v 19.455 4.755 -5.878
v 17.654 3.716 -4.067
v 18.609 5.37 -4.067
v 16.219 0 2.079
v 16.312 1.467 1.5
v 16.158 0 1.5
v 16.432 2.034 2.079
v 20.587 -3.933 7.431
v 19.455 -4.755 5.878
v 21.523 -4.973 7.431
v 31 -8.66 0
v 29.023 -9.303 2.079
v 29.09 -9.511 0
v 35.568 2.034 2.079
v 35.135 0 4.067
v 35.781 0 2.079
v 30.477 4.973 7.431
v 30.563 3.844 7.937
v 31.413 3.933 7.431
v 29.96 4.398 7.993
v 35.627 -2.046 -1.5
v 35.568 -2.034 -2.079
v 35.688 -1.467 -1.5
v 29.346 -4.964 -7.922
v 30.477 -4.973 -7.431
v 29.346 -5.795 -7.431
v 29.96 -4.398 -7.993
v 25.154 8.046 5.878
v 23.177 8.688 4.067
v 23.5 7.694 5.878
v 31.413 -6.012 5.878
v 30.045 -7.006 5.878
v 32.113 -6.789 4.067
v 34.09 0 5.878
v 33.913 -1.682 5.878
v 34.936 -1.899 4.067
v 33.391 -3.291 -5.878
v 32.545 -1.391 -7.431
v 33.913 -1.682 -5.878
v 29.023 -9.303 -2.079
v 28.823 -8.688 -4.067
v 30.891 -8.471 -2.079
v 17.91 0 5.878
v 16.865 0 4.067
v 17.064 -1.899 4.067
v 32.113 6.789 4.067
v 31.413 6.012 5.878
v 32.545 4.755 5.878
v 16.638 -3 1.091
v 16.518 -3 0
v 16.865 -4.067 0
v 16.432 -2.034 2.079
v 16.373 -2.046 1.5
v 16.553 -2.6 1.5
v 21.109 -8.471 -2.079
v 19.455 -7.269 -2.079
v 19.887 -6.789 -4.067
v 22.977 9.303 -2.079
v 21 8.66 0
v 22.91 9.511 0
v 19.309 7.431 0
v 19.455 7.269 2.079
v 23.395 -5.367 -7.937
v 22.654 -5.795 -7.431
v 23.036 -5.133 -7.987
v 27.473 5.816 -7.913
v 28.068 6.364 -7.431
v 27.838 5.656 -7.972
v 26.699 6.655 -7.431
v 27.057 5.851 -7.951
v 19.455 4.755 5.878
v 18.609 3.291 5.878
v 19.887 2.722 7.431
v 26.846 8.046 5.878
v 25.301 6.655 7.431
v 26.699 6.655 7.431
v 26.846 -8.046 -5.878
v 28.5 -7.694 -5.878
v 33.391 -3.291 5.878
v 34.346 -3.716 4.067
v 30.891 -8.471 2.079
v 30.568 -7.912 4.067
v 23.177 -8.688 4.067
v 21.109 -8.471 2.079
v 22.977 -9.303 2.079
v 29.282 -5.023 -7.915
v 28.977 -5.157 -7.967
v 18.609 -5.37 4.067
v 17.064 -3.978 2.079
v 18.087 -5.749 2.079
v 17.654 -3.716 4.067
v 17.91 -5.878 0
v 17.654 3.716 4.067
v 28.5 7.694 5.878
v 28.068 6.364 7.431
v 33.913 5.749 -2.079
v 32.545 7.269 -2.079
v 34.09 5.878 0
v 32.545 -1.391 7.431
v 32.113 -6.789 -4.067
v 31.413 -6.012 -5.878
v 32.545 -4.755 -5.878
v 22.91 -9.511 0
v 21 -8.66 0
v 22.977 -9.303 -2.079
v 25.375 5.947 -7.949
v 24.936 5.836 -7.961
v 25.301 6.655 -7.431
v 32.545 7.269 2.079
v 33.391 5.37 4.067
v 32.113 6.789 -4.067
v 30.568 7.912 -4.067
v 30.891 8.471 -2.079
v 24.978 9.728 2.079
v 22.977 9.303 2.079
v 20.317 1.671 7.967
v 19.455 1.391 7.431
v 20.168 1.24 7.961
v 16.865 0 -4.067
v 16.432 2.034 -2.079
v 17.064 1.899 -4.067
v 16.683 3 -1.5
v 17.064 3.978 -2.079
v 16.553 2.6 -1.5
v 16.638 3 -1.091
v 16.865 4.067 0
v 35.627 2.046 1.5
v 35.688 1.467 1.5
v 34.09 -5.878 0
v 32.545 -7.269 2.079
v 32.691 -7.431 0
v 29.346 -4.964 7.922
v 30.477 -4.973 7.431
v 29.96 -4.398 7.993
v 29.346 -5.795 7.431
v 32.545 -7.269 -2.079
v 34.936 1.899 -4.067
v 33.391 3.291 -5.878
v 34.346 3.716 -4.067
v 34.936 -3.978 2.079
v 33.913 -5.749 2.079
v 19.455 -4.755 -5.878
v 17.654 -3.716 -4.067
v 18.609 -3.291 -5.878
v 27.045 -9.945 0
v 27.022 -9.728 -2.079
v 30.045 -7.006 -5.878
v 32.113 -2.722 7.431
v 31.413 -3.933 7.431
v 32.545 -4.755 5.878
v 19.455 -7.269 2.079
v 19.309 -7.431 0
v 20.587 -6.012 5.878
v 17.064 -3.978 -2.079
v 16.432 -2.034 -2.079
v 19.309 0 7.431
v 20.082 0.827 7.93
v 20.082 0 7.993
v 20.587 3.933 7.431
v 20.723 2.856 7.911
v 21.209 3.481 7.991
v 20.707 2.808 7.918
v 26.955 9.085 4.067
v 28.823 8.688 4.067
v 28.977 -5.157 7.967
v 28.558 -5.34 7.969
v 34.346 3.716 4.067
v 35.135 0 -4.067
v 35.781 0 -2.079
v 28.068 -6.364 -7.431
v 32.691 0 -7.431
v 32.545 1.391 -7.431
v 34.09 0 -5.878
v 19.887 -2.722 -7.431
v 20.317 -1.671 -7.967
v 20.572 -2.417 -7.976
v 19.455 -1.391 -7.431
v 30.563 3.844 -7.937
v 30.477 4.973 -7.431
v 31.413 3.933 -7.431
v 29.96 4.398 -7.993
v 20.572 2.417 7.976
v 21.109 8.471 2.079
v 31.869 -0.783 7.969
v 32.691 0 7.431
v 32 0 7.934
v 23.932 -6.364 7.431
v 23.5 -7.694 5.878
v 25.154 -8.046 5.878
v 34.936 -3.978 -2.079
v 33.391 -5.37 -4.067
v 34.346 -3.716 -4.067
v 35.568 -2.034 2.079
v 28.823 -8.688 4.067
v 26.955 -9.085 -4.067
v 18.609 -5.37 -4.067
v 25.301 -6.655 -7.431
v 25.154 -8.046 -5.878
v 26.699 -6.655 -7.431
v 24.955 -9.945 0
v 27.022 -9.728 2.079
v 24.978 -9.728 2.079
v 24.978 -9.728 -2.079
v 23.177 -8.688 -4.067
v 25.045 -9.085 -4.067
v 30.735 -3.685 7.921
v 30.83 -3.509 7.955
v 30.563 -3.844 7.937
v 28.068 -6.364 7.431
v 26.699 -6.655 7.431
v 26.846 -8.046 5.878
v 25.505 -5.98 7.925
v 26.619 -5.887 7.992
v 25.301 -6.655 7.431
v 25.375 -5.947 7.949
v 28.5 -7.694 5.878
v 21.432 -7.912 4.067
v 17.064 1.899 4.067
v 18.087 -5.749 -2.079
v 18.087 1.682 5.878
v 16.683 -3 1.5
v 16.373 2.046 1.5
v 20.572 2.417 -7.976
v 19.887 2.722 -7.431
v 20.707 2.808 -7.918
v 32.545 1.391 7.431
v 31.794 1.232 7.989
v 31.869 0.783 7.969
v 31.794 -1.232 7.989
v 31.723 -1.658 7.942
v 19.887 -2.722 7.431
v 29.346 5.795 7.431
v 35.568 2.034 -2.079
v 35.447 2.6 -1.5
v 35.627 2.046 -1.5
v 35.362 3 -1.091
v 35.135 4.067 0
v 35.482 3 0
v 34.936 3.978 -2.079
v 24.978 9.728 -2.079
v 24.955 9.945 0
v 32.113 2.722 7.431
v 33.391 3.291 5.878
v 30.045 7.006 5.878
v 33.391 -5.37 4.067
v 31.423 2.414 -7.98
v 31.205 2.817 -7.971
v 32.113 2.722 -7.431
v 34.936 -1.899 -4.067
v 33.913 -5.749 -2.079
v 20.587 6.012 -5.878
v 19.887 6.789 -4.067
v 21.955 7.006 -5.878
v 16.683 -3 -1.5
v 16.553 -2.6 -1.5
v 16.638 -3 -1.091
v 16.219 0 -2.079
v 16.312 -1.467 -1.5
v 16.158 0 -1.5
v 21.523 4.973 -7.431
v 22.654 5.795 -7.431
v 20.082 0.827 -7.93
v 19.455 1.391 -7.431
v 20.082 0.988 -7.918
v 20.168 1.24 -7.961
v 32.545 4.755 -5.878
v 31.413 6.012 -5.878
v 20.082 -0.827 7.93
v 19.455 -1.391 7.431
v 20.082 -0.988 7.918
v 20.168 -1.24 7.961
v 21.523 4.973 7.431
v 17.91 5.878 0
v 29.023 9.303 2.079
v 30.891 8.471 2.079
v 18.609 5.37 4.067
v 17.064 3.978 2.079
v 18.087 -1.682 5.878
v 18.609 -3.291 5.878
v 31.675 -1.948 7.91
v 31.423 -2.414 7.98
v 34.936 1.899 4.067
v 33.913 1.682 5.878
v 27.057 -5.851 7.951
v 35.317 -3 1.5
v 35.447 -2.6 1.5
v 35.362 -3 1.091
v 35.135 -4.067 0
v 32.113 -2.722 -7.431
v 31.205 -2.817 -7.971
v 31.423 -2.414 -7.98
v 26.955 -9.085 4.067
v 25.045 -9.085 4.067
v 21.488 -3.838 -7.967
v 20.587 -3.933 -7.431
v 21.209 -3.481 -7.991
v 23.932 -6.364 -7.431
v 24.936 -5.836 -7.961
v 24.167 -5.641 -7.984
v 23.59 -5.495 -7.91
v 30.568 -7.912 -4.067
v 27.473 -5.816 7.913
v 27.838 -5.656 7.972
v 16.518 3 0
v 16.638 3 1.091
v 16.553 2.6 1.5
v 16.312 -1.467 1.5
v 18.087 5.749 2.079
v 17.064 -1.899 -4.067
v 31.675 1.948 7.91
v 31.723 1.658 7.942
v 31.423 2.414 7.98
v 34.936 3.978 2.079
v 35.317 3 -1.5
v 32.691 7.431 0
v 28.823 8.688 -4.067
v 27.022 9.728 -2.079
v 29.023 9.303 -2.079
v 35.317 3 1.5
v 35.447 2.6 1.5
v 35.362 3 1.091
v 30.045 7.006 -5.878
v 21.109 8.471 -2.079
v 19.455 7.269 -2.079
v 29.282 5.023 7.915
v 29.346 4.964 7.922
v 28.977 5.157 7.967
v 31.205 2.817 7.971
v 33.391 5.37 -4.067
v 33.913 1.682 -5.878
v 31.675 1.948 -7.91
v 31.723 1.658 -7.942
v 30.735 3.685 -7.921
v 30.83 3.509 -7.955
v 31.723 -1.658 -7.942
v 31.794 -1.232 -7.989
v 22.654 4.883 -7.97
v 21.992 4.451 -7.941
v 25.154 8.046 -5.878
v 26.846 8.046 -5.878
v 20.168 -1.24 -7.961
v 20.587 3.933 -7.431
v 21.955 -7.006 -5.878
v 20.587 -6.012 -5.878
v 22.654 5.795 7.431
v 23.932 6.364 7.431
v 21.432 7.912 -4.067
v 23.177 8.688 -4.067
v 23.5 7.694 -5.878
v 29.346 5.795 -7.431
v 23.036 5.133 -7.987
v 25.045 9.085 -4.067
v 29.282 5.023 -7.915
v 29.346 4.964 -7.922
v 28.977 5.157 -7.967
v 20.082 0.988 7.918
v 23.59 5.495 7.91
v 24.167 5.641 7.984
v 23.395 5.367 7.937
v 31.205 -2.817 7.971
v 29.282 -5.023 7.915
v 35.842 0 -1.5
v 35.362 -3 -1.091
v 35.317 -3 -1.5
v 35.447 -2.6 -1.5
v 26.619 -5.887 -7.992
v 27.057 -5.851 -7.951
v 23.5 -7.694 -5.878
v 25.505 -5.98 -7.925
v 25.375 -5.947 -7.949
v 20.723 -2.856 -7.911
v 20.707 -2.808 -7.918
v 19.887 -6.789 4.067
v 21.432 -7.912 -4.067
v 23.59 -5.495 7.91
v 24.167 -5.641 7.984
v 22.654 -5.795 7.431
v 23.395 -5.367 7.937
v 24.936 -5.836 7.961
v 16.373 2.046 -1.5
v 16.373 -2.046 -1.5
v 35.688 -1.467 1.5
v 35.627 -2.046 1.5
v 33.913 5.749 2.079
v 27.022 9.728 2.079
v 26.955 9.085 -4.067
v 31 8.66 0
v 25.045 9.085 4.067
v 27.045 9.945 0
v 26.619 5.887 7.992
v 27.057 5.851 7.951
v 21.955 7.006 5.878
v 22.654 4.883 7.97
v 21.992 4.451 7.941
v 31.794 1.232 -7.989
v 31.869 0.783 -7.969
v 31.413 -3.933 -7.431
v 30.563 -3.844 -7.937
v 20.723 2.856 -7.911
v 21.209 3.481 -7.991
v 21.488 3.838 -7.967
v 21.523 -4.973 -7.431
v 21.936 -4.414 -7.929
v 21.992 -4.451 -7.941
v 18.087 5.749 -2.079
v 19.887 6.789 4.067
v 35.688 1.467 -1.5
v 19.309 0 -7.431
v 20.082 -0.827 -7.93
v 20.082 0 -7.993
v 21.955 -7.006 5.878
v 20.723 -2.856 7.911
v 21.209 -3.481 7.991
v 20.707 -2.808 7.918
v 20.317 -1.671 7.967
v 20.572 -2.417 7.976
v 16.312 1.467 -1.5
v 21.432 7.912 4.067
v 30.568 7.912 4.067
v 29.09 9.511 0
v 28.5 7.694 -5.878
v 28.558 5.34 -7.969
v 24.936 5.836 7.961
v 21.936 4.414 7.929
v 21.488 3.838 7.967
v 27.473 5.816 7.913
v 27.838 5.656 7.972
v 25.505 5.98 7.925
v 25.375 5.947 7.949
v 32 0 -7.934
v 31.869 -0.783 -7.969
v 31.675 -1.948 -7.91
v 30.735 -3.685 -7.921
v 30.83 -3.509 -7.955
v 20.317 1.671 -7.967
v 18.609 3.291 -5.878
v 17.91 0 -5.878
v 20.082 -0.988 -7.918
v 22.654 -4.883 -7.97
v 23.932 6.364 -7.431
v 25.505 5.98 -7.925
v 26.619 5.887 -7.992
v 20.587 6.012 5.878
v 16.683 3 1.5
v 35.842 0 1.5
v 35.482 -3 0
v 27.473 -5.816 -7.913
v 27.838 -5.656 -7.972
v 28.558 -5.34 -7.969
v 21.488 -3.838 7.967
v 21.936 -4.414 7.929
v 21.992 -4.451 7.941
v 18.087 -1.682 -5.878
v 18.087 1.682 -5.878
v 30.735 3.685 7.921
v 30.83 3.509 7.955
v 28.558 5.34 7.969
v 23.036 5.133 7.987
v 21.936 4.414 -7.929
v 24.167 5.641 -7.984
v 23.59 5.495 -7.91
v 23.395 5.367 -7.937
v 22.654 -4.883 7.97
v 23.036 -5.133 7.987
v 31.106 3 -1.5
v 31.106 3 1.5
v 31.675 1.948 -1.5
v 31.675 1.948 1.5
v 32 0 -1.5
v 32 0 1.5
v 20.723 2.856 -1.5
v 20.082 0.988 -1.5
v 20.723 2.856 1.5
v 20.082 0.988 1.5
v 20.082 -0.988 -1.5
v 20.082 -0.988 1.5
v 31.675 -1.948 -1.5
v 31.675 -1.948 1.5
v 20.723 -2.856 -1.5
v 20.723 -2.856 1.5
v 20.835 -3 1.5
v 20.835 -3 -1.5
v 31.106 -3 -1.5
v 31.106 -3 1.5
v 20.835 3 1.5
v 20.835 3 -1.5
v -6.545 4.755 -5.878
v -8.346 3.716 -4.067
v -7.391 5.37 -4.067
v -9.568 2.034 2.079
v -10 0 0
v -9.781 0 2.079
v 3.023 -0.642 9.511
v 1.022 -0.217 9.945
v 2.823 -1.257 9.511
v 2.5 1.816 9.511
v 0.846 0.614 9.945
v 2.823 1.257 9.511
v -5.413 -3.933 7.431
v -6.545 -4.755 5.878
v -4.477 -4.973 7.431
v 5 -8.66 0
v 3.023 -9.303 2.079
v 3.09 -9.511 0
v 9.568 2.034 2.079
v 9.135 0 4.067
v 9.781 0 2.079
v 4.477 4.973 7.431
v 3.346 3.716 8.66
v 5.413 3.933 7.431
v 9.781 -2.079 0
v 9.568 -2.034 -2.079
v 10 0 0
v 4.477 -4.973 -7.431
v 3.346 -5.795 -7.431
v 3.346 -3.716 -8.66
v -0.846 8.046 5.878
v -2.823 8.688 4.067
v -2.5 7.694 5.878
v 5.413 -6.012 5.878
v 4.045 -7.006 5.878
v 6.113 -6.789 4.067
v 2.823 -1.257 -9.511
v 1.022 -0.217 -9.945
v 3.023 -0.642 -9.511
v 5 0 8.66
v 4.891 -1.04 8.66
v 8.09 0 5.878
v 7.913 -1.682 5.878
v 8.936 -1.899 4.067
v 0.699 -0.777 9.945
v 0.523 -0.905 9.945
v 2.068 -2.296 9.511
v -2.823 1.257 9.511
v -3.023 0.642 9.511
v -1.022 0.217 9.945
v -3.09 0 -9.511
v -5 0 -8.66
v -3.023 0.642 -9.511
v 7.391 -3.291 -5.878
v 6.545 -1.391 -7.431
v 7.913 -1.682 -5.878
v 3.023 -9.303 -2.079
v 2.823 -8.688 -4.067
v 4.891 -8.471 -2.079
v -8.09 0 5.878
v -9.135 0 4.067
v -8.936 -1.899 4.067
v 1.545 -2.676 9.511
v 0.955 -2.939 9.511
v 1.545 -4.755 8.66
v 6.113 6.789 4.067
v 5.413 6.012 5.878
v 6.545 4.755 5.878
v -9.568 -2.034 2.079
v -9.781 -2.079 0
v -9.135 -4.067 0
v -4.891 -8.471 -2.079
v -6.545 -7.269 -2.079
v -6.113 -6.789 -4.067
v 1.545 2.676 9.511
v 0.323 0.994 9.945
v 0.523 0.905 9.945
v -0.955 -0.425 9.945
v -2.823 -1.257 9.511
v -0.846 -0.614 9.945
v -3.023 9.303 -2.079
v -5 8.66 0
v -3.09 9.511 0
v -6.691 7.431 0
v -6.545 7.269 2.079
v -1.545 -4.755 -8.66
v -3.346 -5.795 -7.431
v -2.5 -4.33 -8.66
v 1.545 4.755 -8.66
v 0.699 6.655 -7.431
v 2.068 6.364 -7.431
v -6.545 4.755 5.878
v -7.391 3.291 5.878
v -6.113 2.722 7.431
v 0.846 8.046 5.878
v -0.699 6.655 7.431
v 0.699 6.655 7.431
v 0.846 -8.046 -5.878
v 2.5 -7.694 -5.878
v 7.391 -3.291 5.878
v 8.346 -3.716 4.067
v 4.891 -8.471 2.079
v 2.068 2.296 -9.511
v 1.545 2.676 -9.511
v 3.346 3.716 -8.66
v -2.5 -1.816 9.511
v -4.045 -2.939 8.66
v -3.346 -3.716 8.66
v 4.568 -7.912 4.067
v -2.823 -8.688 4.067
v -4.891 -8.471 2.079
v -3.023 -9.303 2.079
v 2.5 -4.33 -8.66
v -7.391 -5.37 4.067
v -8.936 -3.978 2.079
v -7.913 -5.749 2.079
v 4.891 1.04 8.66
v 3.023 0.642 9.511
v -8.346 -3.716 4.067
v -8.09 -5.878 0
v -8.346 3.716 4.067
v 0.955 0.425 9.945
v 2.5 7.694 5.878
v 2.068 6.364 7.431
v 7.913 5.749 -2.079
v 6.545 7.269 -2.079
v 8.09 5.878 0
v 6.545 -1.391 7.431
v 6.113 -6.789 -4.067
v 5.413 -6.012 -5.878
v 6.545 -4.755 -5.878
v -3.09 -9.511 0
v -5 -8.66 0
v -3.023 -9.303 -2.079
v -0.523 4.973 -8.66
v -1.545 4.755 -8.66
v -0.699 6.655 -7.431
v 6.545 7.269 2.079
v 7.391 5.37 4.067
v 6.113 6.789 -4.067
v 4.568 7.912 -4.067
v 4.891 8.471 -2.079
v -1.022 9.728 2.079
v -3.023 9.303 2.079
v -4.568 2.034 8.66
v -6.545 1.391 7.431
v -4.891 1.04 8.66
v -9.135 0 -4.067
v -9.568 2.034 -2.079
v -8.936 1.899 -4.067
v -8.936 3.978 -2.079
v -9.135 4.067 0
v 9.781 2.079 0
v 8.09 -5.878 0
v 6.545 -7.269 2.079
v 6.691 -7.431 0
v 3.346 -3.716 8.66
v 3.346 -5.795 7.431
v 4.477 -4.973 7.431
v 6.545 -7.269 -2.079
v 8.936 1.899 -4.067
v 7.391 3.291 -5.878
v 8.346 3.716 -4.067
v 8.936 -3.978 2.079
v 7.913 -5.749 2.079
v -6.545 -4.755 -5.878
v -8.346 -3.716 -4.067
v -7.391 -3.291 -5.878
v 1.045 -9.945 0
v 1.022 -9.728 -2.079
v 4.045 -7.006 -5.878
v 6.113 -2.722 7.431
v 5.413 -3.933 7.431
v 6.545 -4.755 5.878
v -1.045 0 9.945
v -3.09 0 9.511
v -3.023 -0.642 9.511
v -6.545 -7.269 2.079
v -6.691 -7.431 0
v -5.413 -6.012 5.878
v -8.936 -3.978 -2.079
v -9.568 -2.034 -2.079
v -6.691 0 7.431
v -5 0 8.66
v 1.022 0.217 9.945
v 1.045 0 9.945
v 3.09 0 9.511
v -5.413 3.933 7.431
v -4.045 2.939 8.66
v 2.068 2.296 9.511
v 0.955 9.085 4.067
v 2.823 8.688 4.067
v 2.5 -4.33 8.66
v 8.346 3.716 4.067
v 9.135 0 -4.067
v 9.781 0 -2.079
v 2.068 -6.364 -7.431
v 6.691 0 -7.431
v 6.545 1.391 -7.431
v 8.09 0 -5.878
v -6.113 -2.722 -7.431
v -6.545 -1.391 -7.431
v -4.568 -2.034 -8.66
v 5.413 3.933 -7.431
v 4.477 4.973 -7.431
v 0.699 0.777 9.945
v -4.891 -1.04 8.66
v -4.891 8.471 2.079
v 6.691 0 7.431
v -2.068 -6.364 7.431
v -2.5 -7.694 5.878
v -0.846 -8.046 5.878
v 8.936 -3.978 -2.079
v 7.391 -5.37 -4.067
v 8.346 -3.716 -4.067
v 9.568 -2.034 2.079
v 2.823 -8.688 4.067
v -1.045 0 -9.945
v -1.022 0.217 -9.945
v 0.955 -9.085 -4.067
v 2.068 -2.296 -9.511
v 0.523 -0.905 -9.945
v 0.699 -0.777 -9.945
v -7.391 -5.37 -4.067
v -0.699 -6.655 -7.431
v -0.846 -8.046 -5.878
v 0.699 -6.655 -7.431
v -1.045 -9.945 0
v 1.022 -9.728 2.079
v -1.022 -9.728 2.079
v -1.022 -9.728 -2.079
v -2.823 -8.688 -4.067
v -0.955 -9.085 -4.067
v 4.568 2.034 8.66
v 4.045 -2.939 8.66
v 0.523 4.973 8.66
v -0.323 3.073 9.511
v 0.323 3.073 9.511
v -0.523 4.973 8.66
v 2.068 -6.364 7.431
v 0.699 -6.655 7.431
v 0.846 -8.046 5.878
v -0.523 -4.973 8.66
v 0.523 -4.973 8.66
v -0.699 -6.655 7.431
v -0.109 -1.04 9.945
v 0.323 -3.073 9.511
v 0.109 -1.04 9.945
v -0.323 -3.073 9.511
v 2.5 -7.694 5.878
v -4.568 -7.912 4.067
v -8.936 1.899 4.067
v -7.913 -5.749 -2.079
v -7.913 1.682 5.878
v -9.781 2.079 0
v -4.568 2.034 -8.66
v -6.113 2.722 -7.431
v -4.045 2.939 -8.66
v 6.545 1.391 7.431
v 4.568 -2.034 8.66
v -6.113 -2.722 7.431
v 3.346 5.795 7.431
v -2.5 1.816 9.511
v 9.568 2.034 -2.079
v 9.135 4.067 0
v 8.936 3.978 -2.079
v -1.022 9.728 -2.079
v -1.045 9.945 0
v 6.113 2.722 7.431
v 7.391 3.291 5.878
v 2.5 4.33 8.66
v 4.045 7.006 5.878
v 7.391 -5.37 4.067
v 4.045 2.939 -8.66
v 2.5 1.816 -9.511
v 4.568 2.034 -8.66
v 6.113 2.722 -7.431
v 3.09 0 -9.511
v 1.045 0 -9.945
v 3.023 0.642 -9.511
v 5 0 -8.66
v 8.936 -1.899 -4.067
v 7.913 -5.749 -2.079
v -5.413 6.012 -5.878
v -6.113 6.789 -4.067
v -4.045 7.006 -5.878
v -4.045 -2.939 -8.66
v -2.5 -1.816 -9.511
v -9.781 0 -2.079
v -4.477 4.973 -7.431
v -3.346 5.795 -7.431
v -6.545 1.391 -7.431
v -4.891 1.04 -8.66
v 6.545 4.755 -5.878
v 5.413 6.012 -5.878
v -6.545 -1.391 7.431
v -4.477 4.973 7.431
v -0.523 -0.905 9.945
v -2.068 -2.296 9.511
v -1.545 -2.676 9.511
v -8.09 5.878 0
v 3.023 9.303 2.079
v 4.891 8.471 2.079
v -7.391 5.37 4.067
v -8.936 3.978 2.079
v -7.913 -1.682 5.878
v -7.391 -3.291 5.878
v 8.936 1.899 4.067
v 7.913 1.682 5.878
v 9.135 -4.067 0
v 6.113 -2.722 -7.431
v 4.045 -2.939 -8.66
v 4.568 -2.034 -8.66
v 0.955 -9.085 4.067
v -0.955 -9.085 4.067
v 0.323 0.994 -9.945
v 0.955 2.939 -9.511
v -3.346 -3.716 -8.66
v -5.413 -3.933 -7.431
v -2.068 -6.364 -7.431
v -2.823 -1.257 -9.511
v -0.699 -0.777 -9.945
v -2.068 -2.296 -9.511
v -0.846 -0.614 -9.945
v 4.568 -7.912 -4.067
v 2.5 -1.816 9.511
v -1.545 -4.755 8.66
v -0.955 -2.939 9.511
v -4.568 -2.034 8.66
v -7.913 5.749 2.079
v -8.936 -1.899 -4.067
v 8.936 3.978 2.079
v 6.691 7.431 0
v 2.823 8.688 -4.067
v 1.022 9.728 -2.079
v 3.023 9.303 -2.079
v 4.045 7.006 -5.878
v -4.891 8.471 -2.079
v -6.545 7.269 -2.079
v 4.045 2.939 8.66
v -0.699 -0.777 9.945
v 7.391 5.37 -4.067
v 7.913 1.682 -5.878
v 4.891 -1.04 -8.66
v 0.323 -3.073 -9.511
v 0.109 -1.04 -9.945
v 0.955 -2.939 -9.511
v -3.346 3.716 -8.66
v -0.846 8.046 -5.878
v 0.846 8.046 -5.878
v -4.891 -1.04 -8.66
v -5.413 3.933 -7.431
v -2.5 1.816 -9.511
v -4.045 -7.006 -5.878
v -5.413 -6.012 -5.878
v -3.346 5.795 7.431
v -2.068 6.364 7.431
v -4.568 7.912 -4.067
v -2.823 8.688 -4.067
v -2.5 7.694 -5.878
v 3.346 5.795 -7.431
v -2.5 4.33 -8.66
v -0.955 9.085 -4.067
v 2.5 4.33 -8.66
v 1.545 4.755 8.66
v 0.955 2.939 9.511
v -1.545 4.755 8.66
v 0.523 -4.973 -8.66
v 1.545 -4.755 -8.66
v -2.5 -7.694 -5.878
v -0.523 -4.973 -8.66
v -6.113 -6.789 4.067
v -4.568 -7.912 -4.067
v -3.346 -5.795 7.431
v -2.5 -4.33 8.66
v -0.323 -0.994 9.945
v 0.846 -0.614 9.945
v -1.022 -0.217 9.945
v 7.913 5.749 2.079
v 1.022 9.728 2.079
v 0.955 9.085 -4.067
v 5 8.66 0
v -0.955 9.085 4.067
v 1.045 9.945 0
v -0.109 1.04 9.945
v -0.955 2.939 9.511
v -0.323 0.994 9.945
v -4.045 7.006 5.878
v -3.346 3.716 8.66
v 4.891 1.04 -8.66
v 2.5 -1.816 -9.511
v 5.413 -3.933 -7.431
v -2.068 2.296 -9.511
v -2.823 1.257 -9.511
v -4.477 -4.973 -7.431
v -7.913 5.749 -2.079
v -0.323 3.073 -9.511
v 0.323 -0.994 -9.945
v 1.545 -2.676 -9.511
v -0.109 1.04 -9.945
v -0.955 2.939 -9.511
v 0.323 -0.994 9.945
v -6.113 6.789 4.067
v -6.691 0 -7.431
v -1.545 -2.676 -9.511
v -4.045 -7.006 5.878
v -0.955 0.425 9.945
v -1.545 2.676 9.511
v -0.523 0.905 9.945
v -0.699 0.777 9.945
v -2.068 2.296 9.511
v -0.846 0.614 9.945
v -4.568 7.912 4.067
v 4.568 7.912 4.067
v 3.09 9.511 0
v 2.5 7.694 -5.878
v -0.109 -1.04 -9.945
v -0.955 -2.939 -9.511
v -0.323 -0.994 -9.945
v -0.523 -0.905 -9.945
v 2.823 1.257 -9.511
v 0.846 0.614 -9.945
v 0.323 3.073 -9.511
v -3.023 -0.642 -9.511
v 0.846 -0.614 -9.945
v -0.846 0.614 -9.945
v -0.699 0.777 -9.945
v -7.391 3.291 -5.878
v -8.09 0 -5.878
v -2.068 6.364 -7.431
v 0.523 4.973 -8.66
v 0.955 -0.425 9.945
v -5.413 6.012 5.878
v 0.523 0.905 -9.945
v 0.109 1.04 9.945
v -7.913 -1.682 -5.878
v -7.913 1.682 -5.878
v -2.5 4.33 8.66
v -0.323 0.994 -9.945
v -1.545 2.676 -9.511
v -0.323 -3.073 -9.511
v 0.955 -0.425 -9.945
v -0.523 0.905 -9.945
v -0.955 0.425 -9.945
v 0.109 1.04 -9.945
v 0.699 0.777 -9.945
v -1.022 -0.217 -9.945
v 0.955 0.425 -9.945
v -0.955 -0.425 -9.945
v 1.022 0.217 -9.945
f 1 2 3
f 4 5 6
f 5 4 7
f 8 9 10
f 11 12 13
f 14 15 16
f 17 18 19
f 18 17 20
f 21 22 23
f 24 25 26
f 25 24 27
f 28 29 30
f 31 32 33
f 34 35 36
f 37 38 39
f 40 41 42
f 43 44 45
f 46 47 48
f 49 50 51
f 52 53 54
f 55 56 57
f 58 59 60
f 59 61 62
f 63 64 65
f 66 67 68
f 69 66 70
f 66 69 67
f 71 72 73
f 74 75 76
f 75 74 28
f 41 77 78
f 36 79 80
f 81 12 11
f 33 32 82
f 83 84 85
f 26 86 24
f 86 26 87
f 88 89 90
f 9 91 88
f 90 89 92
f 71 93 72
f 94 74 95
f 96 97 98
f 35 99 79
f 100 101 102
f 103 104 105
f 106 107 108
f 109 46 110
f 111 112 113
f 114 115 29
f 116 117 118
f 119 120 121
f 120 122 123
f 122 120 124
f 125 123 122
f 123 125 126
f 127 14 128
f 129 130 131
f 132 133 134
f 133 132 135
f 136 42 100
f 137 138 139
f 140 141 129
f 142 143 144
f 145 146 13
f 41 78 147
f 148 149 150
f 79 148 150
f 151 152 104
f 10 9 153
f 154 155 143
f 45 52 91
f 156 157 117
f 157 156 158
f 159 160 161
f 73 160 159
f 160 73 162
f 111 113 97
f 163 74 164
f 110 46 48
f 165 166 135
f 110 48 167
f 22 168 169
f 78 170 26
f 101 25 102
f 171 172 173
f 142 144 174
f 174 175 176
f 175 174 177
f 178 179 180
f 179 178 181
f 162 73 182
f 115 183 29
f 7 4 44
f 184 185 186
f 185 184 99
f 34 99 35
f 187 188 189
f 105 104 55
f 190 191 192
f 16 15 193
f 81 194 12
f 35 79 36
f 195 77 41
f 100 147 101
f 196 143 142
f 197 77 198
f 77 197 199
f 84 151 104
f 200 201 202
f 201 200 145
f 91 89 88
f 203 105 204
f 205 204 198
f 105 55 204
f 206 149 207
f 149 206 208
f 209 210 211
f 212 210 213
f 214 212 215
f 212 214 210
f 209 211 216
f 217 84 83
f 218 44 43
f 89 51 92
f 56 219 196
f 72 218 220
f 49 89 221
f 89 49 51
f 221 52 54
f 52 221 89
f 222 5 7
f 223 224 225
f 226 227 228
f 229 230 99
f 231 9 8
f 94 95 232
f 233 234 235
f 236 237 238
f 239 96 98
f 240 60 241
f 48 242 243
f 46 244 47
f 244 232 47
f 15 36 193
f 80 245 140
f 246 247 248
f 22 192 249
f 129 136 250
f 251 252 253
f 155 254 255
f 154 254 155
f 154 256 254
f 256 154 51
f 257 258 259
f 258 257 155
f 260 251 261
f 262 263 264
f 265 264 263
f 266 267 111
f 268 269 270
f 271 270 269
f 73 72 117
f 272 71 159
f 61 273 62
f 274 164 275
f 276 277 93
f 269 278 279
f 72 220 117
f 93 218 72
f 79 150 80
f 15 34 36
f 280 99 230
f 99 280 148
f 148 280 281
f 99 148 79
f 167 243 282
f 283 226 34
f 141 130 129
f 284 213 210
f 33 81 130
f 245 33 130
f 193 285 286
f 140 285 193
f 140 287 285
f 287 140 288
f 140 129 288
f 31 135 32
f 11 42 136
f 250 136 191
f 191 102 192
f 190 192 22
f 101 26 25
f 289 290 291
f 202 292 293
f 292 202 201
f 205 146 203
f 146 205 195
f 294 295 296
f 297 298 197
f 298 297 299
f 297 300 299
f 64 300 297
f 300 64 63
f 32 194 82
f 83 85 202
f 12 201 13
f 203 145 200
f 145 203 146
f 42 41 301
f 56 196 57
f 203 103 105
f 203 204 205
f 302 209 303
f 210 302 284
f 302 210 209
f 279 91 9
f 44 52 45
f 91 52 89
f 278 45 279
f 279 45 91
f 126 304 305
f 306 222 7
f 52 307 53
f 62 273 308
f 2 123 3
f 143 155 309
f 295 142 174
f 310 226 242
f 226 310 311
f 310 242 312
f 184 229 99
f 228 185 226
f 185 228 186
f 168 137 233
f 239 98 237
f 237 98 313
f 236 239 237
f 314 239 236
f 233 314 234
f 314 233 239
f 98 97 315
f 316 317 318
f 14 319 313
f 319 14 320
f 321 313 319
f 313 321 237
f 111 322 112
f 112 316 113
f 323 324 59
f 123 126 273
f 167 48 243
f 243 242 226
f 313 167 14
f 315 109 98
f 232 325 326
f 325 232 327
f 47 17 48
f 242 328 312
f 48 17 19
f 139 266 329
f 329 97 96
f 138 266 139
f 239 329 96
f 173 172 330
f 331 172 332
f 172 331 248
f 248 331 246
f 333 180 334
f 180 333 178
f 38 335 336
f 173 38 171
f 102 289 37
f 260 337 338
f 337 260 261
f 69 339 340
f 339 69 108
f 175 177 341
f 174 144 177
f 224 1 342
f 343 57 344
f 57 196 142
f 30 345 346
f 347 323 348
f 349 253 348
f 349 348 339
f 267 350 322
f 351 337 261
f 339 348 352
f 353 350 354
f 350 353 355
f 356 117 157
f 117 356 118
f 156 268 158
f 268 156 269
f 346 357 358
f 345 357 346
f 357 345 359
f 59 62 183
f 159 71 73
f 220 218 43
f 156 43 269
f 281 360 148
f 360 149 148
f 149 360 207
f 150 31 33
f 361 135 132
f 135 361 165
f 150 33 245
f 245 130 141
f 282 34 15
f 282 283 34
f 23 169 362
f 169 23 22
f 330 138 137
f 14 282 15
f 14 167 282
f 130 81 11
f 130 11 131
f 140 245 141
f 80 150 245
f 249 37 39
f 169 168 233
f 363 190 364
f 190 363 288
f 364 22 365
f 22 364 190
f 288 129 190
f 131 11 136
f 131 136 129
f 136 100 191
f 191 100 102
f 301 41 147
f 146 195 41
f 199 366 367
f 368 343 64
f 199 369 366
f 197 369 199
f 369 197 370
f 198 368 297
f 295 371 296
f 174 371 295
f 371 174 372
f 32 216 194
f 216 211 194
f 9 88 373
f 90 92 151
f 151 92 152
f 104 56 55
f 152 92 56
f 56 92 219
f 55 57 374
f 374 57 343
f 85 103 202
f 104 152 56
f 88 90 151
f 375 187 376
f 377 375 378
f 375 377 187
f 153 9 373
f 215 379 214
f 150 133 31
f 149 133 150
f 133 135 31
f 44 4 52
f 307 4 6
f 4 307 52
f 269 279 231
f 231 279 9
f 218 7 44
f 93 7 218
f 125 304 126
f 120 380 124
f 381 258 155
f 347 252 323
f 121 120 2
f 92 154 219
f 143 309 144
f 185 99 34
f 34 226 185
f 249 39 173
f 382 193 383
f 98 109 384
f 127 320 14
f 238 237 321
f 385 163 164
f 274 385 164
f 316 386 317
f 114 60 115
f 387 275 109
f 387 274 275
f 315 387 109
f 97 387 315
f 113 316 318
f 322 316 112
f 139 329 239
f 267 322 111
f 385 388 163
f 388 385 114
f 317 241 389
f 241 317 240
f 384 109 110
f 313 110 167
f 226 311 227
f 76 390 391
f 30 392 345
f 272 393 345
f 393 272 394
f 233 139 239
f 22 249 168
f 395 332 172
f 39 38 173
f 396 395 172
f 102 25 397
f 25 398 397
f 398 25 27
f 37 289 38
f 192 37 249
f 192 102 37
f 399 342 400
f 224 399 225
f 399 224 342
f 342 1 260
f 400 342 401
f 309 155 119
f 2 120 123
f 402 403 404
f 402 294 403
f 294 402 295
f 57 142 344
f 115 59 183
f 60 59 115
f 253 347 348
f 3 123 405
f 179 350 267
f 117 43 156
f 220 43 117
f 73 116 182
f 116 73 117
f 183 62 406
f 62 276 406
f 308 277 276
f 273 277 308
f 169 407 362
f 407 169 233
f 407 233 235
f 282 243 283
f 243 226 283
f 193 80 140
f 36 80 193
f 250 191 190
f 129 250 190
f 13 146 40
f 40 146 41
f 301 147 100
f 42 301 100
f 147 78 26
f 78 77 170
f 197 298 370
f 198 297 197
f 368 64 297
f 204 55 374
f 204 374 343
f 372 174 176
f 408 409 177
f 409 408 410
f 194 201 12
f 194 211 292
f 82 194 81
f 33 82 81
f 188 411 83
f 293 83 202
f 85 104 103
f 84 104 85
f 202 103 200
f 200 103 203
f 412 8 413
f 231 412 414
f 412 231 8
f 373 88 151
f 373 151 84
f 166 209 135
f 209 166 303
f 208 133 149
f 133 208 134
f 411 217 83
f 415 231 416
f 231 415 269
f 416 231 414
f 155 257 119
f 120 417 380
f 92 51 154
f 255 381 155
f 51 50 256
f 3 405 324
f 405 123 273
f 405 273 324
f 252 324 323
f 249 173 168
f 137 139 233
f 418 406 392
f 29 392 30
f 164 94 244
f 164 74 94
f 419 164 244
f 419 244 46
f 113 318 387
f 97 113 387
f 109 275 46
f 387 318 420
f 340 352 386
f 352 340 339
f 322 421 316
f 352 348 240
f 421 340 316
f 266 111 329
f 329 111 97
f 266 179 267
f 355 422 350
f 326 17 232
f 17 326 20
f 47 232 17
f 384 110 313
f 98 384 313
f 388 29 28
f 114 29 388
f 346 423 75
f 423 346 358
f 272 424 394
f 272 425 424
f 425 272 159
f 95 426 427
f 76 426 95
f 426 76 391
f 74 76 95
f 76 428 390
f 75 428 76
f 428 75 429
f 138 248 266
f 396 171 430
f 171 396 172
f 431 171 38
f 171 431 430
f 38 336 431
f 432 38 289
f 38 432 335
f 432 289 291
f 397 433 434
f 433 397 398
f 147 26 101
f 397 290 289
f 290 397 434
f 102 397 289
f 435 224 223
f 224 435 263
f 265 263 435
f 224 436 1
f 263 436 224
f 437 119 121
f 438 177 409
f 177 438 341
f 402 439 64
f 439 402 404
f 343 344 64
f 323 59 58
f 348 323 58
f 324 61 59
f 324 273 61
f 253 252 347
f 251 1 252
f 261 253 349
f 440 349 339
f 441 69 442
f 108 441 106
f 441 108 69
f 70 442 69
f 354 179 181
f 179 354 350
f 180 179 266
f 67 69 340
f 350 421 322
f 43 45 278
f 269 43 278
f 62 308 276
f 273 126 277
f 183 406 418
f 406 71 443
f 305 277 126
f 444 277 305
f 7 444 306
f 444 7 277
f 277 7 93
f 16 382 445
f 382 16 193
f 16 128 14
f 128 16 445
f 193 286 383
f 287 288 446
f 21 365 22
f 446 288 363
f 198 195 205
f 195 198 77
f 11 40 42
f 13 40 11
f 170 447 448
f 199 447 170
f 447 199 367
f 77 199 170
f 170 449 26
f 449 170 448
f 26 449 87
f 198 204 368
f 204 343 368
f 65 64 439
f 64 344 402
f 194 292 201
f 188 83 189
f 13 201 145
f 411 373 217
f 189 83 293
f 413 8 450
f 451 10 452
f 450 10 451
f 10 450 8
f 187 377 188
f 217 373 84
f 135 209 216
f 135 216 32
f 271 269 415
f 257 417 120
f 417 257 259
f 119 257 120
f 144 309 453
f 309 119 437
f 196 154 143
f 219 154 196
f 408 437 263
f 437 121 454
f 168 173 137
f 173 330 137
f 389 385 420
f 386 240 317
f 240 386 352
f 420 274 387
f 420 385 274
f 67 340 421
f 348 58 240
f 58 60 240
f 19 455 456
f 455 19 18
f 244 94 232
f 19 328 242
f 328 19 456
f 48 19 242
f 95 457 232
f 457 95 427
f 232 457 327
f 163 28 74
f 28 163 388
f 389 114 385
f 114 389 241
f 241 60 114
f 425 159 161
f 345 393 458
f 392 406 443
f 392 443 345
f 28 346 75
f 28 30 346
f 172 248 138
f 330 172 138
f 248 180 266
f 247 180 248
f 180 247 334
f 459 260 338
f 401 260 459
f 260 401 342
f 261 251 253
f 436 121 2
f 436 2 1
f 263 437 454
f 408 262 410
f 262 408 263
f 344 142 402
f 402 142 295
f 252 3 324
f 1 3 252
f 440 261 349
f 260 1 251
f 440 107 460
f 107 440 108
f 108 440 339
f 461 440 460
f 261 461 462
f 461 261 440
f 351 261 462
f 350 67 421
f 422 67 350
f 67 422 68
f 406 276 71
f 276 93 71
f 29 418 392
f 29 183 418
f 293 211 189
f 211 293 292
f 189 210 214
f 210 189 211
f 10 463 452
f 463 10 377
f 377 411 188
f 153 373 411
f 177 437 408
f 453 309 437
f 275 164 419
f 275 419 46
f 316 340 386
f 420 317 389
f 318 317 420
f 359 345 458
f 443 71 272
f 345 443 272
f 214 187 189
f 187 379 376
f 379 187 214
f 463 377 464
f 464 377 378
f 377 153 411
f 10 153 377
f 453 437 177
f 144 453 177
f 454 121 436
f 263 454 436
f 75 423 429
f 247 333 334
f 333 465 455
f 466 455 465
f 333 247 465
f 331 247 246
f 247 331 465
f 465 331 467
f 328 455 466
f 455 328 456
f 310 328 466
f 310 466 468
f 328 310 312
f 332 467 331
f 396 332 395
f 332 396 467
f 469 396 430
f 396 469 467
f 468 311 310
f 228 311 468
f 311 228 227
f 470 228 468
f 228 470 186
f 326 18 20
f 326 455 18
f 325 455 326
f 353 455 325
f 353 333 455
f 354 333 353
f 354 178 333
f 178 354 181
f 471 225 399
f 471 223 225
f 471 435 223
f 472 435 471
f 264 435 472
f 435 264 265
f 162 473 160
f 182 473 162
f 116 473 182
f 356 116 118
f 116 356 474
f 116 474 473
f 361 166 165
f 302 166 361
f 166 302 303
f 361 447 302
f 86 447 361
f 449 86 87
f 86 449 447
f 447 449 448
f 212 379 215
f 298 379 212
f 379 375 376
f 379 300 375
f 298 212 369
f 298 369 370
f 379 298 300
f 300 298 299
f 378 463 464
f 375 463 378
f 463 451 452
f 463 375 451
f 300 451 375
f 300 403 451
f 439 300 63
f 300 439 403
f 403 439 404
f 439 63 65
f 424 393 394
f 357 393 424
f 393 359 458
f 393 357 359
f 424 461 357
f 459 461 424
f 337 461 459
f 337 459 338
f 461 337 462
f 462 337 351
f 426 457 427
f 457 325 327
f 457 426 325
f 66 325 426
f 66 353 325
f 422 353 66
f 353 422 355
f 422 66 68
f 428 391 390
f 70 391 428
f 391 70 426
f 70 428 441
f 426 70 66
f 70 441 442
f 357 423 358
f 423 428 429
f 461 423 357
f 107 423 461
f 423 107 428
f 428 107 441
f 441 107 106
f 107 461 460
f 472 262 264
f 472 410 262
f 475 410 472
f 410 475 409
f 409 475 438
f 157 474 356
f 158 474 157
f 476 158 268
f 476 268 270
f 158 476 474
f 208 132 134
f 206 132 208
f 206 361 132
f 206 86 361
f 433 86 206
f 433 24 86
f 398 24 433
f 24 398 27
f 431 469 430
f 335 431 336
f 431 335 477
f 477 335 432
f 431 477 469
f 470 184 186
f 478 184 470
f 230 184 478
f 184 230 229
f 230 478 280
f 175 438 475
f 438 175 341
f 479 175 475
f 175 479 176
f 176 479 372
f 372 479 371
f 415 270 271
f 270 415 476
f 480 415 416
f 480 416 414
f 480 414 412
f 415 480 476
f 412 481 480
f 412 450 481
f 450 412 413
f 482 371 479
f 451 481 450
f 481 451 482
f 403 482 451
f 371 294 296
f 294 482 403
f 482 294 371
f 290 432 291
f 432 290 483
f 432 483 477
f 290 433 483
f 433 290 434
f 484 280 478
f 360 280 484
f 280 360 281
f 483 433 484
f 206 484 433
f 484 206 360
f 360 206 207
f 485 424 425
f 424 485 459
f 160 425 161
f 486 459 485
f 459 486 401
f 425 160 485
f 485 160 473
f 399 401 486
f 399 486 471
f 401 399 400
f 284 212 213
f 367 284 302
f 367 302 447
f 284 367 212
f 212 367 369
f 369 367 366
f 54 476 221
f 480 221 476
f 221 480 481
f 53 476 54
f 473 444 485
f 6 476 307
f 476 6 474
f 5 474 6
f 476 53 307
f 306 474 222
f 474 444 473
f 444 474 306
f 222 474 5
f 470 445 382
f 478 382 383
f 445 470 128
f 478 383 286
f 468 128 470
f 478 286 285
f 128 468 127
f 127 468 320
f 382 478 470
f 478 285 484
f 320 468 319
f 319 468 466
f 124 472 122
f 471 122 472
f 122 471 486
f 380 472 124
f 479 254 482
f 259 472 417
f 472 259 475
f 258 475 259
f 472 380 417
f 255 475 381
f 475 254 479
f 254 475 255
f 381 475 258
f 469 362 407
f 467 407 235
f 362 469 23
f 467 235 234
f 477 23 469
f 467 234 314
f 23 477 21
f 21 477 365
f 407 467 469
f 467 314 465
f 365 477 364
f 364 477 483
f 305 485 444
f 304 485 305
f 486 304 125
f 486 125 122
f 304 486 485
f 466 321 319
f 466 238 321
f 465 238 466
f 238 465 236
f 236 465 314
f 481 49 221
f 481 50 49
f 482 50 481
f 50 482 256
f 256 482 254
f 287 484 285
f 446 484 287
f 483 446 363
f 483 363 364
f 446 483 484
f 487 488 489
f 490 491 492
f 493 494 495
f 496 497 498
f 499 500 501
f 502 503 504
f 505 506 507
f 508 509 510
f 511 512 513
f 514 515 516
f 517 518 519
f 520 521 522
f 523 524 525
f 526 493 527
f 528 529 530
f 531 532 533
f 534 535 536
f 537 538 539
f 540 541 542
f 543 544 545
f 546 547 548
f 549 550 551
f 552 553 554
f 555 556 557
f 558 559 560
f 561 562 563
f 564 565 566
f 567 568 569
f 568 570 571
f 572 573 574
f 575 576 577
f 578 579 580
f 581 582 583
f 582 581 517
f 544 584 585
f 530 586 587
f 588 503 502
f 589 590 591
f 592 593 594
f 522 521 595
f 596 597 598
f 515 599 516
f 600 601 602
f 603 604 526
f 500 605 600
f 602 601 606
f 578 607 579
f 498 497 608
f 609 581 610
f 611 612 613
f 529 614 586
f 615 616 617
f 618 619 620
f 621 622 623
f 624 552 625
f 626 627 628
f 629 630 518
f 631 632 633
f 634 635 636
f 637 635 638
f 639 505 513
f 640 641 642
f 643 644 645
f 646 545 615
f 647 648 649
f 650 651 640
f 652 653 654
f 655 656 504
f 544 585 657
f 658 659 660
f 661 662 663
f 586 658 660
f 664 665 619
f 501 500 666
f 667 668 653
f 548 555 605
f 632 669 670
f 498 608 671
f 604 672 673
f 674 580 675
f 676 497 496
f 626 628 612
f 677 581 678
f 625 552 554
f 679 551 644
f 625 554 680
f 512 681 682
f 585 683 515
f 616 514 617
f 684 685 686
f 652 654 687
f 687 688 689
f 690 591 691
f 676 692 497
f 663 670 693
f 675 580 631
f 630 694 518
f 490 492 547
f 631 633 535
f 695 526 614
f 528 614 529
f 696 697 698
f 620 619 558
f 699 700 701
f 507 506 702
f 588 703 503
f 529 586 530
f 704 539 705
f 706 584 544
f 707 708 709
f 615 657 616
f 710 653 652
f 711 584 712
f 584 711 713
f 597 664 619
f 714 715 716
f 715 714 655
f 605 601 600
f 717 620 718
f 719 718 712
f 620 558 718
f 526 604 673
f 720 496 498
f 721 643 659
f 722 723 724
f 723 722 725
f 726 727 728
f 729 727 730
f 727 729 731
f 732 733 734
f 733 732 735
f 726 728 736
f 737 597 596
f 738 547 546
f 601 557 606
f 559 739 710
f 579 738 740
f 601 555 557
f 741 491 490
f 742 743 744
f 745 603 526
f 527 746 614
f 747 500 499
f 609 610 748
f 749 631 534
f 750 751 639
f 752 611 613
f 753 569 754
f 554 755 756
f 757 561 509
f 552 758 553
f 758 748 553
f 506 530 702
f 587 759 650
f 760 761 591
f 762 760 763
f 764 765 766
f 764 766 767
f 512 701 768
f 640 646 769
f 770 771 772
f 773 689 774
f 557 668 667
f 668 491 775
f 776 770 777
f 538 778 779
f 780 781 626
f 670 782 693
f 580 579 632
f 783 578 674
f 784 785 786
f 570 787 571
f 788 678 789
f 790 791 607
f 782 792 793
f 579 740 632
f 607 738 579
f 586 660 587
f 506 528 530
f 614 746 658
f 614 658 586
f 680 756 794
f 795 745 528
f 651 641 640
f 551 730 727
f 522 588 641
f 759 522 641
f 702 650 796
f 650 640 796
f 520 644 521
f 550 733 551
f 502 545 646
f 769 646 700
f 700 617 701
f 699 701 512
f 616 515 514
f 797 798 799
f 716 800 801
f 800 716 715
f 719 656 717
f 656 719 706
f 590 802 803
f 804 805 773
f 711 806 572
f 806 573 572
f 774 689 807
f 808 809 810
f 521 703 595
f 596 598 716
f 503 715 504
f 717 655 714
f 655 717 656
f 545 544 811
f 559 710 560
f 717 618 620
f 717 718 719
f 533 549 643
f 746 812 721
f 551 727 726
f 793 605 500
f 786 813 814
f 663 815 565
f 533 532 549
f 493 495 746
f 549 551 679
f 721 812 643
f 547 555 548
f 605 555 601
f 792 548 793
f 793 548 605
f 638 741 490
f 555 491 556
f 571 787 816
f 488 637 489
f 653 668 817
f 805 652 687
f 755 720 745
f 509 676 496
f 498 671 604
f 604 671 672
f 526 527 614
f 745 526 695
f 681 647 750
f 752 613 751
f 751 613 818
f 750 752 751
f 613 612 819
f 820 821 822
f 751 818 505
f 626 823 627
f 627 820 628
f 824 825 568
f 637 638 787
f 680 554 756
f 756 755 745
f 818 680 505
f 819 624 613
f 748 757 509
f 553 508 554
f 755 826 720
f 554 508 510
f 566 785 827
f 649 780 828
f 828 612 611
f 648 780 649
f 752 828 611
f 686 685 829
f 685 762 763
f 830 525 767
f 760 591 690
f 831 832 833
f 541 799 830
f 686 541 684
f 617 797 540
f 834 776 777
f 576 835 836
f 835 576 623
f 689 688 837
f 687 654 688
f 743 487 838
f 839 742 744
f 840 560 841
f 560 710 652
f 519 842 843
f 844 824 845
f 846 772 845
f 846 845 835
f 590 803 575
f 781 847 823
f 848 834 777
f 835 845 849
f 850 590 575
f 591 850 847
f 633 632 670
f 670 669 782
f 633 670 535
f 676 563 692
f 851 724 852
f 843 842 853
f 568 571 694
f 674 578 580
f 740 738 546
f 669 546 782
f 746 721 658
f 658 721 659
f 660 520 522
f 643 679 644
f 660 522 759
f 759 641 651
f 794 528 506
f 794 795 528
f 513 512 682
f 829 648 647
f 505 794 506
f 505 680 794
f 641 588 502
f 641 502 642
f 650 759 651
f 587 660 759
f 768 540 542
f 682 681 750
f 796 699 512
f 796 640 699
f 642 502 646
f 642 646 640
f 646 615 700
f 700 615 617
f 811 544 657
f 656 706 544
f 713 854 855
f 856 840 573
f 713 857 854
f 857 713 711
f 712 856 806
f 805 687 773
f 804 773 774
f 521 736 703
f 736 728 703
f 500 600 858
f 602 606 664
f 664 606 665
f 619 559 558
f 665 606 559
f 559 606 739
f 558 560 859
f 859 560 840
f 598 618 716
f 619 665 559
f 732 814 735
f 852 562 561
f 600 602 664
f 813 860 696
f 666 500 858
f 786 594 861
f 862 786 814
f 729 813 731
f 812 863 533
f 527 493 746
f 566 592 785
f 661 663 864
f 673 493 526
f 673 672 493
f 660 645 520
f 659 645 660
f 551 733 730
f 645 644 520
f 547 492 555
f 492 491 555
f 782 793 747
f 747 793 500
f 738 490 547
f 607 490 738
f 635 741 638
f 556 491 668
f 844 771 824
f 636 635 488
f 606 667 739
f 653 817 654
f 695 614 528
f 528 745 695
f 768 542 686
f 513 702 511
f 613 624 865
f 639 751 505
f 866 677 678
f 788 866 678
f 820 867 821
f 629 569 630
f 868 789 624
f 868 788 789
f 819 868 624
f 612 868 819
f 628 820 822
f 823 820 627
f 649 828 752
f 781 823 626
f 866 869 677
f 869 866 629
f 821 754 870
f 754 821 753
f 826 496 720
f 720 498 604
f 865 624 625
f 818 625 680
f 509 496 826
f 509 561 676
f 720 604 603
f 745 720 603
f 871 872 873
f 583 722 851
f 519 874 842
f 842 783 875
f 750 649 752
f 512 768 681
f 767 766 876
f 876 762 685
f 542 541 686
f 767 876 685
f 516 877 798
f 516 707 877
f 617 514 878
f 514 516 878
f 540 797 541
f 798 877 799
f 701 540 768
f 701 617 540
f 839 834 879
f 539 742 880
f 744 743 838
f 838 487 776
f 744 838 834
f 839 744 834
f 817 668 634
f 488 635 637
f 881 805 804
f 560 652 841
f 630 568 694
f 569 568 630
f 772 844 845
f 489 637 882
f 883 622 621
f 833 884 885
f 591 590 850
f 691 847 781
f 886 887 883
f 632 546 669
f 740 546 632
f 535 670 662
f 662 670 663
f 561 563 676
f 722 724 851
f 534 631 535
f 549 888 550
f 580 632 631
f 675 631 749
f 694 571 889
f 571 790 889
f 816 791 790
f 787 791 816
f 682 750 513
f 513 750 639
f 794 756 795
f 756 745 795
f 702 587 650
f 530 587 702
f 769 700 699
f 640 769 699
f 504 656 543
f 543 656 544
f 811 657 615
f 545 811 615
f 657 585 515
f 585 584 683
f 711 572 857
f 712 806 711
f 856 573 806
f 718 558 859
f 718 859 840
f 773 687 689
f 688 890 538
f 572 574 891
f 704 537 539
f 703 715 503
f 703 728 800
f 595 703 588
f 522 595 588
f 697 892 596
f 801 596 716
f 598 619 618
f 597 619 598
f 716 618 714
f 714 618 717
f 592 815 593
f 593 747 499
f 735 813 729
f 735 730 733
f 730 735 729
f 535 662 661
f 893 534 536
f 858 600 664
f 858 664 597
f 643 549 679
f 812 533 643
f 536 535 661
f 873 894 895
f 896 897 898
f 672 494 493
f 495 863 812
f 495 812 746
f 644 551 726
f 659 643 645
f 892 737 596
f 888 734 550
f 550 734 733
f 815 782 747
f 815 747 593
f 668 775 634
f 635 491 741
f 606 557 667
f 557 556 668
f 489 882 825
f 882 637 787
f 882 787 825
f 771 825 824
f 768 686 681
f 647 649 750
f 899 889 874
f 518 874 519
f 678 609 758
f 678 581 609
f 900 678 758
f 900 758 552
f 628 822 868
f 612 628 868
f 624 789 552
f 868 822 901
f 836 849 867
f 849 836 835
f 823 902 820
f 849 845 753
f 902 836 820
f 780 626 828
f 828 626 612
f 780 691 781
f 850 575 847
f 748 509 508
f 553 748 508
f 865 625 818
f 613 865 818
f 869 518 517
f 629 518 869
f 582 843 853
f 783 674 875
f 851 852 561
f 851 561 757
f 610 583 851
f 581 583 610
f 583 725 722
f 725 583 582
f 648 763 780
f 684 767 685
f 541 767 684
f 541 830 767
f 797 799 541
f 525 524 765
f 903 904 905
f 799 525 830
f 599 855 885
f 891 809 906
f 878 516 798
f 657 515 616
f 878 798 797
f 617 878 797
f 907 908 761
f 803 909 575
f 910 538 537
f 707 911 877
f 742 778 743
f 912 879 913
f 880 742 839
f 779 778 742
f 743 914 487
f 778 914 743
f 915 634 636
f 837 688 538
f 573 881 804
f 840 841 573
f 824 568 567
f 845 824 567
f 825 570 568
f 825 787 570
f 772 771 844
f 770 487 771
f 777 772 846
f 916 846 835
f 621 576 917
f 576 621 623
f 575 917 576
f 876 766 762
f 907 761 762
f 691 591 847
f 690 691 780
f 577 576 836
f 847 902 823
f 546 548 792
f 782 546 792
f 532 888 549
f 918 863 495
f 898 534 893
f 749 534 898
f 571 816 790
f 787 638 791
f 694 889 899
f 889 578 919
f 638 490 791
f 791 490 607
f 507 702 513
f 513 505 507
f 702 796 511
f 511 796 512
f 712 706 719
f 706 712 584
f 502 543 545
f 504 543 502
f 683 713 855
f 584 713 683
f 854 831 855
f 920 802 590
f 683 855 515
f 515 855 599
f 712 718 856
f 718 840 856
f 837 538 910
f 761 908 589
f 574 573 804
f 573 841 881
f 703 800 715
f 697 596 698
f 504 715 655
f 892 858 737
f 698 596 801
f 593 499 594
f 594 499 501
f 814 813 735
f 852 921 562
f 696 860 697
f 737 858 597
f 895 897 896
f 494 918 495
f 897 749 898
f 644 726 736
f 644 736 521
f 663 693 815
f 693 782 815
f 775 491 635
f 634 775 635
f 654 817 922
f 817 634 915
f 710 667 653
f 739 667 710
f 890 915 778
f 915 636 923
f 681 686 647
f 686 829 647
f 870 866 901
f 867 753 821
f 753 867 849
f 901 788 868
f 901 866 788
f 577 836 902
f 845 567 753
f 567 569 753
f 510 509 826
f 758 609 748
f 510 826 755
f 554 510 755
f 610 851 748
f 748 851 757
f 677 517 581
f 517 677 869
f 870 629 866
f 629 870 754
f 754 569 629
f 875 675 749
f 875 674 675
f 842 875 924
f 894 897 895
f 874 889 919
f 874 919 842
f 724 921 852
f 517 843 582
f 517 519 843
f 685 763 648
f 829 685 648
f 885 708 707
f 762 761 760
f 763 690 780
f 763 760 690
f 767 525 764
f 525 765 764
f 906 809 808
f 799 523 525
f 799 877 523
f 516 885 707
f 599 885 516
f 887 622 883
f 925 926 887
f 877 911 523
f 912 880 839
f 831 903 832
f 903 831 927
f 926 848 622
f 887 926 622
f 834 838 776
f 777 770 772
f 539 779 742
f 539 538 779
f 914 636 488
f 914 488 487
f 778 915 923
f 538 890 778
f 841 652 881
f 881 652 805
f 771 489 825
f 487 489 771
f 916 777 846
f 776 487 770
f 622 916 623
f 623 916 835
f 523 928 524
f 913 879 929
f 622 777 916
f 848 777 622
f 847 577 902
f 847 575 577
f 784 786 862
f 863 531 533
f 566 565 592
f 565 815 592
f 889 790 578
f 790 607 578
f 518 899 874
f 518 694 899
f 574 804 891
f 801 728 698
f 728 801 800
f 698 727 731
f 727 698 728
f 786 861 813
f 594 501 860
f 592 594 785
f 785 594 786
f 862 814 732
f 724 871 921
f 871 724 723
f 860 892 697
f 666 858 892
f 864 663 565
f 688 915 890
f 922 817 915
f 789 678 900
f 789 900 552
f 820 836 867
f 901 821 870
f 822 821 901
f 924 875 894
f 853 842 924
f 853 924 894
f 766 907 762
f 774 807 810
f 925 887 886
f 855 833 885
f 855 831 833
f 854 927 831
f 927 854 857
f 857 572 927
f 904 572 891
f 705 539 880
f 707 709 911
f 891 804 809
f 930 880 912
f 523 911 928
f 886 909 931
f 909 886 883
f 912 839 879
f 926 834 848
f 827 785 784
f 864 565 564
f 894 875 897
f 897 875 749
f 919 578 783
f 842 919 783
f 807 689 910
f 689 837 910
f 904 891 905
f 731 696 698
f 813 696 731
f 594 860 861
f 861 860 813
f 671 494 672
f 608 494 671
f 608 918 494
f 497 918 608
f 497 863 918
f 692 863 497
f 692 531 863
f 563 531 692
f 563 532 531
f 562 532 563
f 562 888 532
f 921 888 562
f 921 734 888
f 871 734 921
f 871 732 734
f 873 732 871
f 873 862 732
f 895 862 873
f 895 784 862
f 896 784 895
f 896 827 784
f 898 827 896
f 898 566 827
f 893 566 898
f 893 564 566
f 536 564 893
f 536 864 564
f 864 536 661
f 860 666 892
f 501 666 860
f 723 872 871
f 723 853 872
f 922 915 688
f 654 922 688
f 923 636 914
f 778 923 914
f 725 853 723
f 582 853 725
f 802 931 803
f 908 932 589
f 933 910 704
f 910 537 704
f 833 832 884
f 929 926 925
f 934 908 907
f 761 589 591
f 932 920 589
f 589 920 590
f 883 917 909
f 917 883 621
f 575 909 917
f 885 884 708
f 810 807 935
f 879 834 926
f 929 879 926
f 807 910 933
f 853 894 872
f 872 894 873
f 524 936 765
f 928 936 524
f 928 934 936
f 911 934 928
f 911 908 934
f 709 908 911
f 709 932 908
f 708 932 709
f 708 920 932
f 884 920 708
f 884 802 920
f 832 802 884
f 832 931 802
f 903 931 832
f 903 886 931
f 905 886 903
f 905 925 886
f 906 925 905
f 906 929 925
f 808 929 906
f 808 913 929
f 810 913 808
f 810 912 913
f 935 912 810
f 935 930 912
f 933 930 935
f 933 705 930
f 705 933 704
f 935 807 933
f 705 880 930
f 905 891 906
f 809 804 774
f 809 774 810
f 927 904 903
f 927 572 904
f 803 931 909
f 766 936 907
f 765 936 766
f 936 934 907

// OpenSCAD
// Volume: 6079.599312132456, SurfaceArea: 2910.986756418589
difference() {
  sphere(r=10);
  %#cylinder(h=30, r=6, center=true);
  %#if (true) cube([25,6,3], center=true);
}
%#translate([0,-9,0]) difference() {
  color("green") cube([10,4,10], center=true);
  color("red") translate([0,-2,0]) sphere(3);
}
%translate([13,0,0]){
  difference() {
    sphere(r=10);
    cylinder(h=30, r=6, center=true);
    if (true) cube([25,6,3], center=true);
  }
  #translate([0,-9,0]) difference() {
    color("green") cube([10,4,10], center=true);
    color("red") translate([0,-2,0]) sphere(3);
  }
}
#translate([26,0,0]){
  difference() {
    sphere(r=10);
    cylinder(h=30, r=6, center=true);
    if (true) cube([25,6,3], center=true);
  }
  %translate([0,-9,0]) difference() {
    color("green") cube([10,4,10], center=true);
    color("red") translate([0,-2,0]) sphere(3);
  }
}
